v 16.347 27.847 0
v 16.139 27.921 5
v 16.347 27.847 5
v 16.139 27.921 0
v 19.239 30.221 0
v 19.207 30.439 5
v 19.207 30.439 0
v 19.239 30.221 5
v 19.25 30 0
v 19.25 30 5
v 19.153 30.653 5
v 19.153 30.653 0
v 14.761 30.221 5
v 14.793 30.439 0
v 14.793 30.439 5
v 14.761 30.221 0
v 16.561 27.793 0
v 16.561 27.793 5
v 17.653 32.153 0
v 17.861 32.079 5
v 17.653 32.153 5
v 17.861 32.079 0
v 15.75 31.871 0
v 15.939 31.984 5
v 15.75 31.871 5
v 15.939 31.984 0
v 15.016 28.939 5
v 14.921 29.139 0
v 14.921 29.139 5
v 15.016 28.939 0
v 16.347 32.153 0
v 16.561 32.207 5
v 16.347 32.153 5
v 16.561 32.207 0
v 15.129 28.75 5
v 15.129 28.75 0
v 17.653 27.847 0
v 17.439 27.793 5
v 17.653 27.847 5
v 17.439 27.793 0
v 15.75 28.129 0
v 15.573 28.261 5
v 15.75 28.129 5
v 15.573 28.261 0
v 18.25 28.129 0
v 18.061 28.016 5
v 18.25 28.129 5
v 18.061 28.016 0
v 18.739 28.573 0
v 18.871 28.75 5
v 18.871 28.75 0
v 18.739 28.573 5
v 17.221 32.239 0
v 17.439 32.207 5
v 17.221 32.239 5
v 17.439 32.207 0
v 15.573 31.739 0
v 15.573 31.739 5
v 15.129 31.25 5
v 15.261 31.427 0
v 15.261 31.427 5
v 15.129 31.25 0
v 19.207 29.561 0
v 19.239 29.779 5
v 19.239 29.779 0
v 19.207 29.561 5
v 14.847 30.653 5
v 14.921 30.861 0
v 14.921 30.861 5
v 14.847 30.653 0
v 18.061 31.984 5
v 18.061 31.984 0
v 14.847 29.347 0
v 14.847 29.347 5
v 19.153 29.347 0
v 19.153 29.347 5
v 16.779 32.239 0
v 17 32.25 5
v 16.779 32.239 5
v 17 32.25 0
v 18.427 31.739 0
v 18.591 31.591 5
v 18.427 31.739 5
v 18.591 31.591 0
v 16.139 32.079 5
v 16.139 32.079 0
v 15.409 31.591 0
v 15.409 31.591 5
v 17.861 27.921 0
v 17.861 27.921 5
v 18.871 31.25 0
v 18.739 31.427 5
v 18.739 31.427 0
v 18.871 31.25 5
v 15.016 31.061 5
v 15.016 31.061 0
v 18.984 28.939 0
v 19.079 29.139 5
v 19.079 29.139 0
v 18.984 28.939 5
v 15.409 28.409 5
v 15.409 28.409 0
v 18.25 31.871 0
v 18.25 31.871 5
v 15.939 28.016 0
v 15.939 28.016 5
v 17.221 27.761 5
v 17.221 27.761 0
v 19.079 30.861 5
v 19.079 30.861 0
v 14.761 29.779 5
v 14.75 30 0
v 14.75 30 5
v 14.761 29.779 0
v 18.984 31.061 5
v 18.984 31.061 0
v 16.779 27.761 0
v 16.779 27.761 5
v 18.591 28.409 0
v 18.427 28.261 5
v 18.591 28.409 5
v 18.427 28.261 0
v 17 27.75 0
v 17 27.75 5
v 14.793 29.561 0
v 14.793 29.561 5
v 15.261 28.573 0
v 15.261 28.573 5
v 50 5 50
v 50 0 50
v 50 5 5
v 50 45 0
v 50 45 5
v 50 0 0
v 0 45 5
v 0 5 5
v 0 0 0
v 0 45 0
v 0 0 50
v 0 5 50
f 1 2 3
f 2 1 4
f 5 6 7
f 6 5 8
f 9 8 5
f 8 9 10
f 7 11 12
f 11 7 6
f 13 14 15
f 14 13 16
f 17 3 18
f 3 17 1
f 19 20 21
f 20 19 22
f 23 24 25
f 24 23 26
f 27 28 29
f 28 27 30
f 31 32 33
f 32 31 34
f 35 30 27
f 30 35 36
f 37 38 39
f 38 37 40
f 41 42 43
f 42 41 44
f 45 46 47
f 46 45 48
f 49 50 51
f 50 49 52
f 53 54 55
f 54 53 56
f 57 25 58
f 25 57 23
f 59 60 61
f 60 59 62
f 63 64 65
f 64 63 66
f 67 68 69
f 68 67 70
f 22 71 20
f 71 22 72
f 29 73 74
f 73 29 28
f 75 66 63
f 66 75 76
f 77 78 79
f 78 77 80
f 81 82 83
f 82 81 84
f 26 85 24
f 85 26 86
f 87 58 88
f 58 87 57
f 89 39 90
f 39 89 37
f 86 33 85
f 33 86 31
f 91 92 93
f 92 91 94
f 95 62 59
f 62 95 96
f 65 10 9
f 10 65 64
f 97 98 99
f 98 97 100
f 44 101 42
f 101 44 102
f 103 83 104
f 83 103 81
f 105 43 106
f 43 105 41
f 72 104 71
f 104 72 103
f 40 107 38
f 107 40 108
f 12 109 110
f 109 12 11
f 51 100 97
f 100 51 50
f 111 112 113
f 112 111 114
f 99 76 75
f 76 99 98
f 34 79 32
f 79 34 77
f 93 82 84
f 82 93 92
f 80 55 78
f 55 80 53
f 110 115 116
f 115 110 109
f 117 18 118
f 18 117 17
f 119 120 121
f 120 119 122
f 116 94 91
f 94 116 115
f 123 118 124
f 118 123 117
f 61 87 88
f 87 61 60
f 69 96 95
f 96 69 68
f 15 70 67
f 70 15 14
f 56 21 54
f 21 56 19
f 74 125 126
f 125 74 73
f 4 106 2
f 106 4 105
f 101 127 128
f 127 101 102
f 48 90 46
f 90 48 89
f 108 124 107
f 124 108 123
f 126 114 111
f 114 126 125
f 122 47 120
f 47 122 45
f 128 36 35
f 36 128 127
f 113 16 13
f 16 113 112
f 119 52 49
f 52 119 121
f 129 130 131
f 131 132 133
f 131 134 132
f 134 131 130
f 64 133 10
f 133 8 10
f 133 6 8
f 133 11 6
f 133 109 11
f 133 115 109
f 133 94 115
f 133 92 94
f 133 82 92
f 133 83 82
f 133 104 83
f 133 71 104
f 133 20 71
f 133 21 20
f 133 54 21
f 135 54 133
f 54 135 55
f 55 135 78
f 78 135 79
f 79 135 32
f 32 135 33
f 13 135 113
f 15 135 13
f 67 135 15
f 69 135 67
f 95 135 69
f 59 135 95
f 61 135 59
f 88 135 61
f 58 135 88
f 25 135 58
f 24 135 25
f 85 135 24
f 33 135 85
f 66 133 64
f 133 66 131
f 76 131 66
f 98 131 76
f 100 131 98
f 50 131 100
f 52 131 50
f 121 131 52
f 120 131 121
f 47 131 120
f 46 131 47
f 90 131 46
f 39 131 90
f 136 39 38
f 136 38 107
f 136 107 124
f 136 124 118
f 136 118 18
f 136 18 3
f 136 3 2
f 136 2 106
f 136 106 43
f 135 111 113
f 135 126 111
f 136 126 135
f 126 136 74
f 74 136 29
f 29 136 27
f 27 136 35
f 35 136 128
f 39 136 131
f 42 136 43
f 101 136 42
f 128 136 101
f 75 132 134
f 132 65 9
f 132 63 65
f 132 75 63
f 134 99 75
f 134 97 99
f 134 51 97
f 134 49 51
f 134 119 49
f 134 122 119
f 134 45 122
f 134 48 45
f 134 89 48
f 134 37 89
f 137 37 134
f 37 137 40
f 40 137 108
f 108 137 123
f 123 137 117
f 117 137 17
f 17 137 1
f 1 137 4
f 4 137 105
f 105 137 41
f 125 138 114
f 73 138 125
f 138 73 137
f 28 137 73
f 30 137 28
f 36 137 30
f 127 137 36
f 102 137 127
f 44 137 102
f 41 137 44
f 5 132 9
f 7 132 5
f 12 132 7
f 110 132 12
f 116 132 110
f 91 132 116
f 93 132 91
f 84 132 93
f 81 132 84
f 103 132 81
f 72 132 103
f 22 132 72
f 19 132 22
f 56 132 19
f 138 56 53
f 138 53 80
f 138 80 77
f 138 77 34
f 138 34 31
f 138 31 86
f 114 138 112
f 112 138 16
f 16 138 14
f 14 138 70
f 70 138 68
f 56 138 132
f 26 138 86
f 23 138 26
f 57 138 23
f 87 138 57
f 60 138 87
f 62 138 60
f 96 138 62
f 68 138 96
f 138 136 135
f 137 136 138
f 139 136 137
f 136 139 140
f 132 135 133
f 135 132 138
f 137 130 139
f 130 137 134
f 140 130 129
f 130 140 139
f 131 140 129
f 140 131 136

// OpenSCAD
// NEMA 17 Stepper Motor Mounting Bracket for Syringe Pump
// Units: mm

// --- Base Plate Dimensions ---
base_x_half = 25;      // Half-width of base plate (x: -25 to 25)
base_y_len = 45;       // Length of base plate (y: 0 to 45)
base_z_thick = 5;      // Thickness of base plate (z: 0 to 5)

// --- Motor Mounting Plate Dimensions ---
motor_plate_x_half = 25; // Width of vertical plate (x: -25 to 25)
motor_plate_y_thick = 5; // Thickness of vertical plate (y: 0 to 5)
motor_plate_z_height = 50; // Height of vertical plate (z: 0 to 50)

// --- Hole Dimensions ---
hole_m4_dia = 4.5;     // Diameter for M4 mounting holes
hole_m3_dia = 3.4;     // Diameter for M3 screw holes
hole_boss_dia = 23;    // Diameter for motor centring boss

// --- Hole Positions ---
// M4 Holes on base plate
m4_hole_x = 17;
m4_hole_y = 30;

// M3 Holes on motor plate (31mm square pattern)
m3_pattern_half = 31 / 2; // 15.5 mm from center

// Boss Hole Center
boss_center_x = 0;
boss_center_z = 28;

// --- Extrusion Depth for Boolean Operations ---
cut_depth = 1.0;       // Extra depth to ensure clean cuts

// --- Module: Base Plate ---
module base_plate() {
    // Main block
    difference() {
        cube([base_x_half * 2, base_y_len, base_z_thick], center = false);
        
        // M4 Holes
        // Extend hole depth past the bottom (z=0) and top (z=5)
        for (i = [-1, 1]) {
            $fn = 64;
            translate([i * m4_hole_x, m4_hole_y, -cut_depth]) {
                cylinder(d = hole_m4_dia, h = base_z_thick + 2 * cut_depth, center = false);
            }
        }
    }
}

// --- Module: Motor Plate ---
module motor_plate() {
    // Main block
    difference() {
        cube([motor_plate_x_half * 2, motor_plate_y_thick, motor_plate_z_height], center = false);
        
        // Boss Hole (along Y axis)
        // Center at x=0, z=28. Extends through the plate (y: 0 to 5).
        // Extend past faces y=0 and y=5.
        $fn = 64;
        translate([boss_center_x, -cut_depth, boss_center_z]) {
            // Rotate cylinder from Z-axis to Y-axis
            rotate([90, 0, 0]) {
                cylinder(d = hole_boss_dia, h = motor_plate_y_thick + 2 * cut_depth, center = false);
            }
        }
        
        // M3 Screw Holes (along Y axis)
        // 31mm square pattern centered on boss hole (x=0, z=28)
        // Holes at x = +/- 15.5, z = 28 +/- 15.5
        for (ix = [-1, 1]) {
            for (iz = [-1, 1]) {
                $fn = 64;
                translate([ix * m3_pattern_half, -cut_depth, boss_center_z + iz * m3_pattern_half]) {
                    rotate([90, 0, 0]) {
                        cylinder(d = hole_m3_dia, h = motor_plate_y_thick + 2 * cut_depth, center = false);
                    }
                }
            }
        }
    }
}

// --- Module: Gusset ---
module gusset(side) {
    // Side is -1 for left, 1 for right.
    // Right angle corner at y=5, z=5.
    // Legs: +20 in Y, +20 in Z.
    // Triangle vertices in YZ plane: (5,5), (25,5), (5,25)
    
    // X extent:
    // Left: -25 to -20
    // Right: 20 to 25
    x_start = (side == -1) ? -25 : 20;
    x_end = (side == -1) ? -20 : 25;
    
    // Create the 3D gusset by extruding the 2D triangle along X
    linear_extrude(height = x_end - x_start, center = false, convexity = 10) {
        polygon(points = [
            [5, 5],
            [25, 5],
            [5, 25]
        ]);
    }
}

// --- Main Assembly ---
union() {
    // Base Plate
    base_plate();
    
    // Motor Plate (standing on the back edge of the base)
    // Base is z=0..5. Motor plate sits on y=0..5, z=0..50.
    // The motor plate's bottom face (z=0) aligns with the base's bottom face?
    // "standing on the back edge of the base" usually implies the motor plate's 
    // bottom face is at z=0, and its back face is at y=0, aligned with the base's back face.
    // Let's assume the motor plate's bottom is at z=0, same as the base.
    // The motor plate occupies y: 0..5, z: 0..50.
    // The base occupies y: 0..45, z: 0..5.
    // They overlap in y: 0..5, z: 0..5. This is correct for a union.
    motor_plate();
    
    // Left Gusset
    gusset(-1);
    
    // Right Gusset
    gusset(1);
}
